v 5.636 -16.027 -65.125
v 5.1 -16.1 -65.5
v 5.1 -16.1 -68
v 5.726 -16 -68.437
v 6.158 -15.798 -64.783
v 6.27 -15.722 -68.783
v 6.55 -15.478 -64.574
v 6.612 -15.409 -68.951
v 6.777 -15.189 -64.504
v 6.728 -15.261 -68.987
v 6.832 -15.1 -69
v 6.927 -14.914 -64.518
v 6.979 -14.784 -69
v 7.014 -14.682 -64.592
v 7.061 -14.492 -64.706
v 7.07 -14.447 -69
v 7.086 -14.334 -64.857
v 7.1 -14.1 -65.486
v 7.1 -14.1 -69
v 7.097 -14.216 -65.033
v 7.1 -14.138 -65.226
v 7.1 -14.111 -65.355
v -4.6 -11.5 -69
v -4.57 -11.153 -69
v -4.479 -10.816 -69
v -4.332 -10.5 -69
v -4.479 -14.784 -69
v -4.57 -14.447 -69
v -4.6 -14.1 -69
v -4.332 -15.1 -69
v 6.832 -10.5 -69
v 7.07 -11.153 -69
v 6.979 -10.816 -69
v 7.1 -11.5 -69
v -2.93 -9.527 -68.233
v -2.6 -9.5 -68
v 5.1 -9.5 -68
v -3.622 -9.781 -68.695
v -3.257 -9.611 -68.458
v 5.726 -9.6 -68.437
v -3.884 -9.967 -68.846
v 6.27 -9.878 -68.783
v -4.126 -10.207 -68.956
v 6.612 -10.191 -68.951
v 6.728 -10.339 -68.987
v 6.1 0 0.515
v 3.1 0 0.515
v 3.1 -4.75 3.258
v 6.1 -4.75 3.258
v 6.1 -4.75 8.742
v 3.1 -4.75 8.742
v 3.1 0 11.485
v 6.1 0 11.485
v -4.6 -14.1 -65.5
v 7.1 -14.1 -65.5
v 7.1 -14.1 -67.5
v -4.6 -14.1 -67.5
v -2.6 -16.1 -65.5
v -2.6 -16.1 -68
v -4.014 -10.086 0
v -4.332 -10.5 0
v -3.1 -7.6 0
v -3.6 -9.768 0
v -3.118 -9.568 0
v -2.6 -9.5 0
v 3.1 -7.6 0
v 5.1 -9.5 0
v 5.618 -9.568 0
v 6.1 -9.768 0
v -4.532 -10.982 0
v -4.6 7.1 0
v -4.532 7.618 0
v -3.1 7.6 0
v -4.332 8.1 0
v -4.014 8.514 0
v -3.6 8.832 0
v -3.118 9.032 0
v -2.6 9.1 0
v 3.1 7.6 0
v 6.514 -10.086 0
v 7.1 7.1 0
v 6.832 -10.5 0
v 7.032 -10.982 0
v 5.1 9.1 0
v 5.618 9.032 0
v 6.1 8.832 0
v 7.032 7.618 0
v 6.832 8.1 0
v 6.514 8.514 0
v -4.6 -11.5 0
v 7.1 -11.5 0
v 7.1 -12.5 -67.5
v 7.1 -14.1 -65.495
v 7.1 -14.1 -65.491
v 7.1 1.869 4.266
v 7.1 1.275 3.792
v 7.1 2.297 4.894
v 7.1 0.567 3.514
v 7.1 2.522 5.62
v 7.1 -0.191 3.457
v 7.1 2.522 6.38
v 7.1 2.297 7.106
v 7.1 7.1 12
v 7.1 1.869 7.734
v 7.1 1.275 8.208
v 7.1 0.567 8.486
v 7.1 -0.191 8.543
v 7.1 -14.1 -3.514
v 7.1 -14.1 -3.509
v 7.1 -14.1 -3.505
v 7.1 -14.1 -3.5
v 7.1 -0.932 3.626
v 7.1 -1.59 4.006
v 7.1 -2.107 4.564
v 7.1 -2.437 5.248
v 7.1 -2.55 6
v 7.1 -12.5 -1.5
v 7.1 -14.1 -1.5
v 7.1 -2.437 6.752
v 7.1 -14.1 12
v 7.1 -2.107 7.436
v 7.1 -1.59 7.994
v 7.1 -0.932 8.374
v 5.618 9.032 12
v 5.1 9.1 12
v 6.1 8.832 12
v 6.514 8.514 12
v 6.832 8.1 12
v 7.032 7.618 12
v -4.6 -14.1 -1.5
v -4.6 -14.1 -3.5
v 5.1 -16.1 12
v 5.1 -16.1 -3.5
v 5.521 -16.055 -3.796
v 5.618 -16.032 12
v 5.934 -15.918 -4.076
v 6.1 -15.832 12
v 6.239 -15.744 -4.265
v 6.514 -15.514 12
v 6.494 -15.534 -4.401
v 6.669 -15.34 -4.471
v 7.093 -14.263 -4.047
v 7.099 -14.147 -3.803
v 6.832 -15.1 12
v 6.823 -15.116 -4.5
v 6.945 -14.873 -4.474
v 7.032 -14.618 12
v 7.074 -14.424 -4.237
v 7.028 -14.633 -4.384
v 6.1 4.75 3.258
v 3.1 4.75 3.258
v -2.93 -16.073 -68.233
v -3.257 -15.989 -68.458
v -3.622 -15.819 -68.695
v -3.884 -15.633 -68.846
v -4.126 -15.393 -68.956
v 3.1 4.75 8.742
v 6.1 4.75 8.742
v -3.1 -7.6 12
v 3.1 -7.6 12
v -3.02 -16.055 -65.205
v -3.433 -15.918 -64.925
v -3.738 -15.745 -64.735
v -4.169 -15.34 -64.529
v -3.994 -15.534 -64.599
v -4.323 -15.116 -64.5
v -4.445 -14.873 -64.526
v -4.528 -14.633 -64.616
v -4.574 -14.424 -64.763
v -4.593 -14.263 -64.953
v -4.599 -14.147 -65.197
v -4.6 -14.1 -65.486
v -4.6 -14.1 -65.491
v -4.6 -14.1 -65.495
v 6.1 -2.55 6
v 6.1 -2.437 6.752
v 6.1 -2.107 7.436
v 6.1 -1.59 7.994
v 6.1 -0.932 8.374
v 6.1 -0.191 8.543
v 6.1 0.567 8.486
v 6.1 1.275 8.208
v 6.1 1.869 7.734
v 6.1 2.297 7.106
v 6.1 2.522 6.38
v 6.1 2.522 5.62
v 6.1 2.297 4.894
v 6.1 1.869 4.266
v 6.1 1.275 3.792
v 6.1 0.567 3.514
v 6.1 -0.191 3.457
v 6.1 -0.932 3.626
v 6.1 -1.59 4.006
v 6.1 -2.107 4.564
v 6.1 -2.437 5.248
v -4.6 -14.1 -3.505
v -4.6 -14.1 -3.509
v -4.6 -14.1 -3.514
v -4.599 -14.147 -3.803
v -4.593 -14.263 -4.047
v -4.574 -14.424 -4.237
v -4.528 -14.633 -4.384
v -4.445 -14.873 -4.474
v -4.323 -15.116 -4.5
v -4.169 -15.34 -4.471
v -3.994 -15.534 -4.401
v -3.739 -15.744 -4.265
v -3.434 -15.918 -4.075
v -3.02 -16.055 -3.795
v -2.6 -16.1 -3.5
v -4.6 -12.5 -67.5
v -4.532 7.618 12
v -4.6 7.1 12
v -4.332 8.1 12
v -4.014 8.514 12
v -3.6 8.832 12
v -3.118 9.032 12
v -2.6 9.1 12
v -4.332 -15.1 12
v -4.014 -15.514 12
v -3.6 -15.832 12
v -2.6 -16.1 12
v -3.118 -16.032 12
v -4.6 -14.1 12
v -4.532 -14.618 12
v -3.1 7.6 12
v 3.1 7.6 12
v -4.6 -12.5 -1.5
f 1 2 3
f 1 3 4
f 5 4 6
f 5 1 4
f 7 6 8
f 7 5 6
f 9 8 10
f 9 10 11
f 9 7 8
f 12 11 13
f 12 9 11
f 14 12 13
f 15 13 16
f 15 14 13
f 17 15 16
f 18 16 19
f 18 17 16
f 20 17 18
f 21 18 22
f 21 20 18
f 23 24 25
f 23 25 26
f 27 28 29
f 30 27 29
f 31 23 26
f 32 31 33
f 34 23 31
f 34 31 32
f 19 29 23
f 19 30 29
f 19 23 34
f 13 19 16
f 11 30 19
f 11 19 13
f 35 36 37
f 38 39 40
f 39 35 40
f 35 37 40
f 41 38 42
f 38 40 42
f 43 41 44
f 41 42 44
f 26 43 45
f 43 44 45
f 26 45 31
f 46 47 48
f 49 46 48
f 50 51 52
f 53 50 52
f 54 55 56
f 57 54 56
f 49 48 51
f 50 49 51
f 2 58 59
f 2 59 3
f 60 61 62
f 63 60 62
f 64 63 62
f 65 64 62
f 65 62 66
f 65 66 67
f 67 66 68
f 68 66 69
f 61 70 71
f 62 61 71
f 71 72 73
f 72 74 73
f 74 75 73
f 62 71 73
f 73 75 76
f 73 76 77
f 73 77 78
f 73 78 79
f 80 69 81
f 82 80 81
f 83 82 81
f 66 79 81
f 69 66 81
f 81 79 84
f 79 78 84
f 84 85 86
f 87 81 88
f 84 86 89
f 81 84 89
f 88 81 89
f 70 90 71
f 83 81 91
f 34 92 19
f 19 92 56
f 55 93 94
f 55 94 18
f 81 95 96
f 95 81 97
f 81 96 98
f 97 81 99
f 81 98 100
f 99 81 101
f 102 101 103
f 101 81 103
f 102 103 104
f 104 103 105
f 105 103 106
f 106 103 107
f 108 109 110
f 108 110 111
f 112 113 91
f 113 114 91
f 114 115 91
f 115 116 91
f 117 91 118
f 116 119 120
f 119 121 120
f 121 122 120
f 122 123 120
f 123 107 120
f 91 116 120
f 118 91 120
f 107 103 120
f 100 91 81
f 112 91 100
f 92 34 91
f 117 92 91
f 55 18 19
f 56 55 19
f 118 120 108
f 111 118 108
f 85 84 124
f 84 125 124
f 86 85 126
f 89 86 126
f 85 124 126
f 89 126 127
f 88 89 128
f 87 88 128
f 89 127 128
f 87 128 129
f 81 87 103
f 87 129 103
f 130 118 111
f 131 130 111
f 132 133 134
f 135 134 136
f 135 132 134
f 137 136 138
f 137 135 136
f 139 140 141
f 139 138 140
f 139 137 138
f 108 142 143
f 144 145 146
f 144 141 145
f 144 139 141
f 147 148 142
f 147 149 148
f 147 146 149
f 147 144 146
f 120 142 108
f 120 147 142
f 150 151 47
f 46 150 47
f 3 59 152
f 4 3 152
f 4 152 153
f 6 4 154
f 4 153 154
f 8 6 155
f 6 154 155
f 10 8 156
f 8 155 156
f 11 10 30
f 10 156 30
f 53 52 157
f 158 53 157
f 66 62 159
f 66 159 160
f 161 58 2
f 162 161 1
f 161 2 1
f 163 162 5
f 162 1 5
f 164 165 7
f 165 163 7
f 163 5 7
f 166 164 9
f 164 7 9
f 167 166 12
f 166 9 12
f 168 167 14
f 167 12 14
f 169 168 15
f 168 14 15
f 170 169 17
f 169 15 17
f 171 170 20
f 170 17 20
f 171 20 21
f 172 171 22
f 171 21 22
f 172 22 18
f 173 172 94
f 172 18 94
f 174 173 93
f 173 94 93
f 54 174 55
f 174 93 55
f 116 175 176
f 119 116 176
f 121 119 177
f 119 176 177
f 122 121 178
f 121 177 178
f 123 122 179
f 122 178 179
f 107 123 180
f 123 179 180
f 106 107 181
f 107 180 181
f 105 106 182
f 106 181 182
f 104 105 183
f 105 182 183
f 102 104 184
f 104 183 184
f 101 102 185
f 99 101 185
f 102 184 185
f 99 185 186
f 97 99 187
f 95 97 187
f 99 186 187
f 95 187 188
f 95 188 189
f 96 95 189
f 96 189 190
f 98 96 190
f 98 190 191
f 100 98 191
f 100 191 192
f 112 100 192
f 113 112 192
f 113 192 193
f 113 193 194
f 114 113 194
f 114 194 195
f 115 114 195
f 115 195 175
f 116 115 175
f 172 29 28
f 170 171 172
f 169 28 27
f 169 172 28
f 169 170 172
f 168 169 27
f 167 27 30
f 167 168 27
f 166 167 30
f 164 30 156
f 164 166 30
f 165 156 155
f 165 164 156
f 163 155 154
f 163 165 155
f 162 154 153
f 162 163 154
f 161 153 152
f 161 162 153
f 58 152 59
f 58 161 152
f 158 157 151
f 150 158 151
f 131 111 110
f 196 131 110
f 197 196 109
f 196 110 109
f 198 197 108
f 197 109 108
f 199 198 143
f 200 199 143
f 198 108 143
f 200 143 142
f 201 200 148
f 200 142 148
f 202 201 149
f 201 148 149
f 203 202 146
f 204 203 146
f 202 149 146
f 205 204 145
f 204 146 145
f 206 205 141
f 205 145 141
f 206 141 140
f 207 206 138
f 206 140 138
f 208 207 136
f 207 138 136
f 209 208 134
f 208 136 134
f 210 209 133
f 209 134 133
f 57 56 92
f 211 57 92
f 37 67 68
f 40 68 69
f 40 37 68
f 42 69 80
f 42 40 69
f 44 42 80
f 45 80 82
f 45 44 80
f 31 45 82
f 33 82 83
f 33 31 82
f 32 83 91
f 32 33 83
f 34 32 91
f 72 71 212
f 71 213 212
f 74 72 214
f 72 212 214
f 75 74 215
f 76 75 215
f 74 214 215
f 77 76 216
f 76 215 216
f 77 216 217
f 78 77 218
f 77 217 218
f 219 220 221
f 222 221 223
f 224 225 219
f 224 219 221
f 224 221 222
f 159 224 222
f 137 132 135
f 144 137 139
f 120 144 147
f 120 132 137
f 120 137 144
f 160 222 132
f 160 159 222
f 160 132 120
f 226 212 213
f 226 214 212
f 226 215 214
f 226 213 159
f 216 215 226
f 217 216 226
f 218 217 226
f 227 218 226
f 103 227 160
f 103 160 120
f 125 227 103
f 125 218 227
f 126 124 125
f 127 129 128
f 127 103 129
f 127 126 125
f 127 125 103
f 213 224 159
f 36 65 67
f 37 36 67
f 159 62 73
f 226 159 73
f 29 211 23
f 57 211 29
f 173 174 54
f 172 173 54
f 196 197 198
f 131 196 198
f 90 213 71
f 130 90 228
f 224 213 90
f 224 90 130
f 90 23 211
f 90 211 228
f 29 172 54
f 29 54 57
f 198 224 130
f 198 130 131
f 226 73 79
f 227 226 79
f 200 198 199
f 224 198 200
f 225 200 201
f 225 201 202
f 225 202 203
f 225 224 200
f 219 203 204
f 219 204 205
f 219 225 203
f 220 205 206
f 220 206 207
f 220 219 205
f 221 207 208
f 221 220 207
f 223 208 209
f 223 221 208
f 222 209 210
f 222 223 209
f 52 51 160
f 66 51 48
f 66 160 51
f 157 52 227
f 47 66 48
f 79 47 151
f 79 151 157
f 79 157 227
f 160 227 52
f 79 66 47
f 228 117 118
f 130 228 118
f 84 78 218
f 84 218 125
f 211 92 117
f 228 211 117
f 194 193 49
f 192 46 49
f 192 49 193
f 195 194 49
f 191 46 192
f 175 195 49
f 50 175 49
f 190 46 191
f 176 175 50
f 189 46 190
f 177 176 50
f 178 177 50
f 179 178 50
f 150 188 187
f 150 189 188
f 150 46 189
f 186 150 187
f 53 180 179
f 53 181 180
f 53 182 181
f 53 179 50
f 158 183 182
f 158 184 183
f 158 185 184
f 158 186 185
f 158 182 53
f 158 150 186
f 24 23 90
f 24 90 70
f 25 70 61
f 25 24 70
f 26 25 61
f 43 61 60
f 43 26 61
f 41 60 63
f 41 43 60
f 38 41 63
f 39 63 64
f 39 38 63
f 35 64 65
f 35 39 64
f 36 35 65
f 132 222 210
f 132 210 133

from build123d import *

# Parameters (mm, degrees)
SKETCH1_W           = 11.7
SKETCH1_H           = 18.2
SKETCH1_W_2         = 6.2
SKETCH1_H_2         = 15.2
BOSS_EXTRUDE1_DEPTH = 12
SKETCH4_R           = 2.55
CUT_EXTRUDE1_DEPTH  = 3
SKETCH4_3_R         = 2.55
CUT_EXTRUDE2_DEPTH  = 17.914490829
SKETCH9_W           = 11.7
SKETCH9_H           = 12
BOSS_EXTRUDE4_DEPTH = 7
SKETCH7_W           = 11.7
SKETCH7_H           = 6.6
BOSS_EXTRUDE3_DEPTH = 69
CUT_EXTRUDE4_DEPTH  = 72.812951478
FILLET1_R           = 2
FILLET2_R           = 1


# Some blends are built 0.0001 mm under size
with BuildPart() as part:
    # Sketch1 → Boss-Extrude1 (new body)
    with BuildSketch(Plane.XY):
        with Locations((1.25, 0)):
            Rectangle(SKETCH1_W, SKETCH1_H)
        Rectangle(SKETCH1_W_2, SKETCH1_H_2, mode=Mode.SUBTRACT)
    extrude(amount=BOSS_EXTRUDE1_DEPTH)

    # Sketch4 → Cut-Extrude1 (cut)
    with BuildSketch(Plane.ZY.offset(-3.1)):
        Polygon((0.515172443, 0), (3.257586221, -4.75), (8.742413779, -4.75), (11.484827557, 0), (8.742413779, 4.75), (3.257586221, 4.75), align=None)
        with Locations(Location((6, 0, 0), (0, 0, 270))):
            Circle(SKETCH4_R, mode=Mode.SUBTRACT)
    extrude(amount=-CUT_EXTRUDE1_DEPTH, mode=Mode.SUBTRACT)

    # Sketch4<3> → Cut-Extrude2 (cut, through all)
    with BuildSketch(Plane.ZY.offset(-3.1)):
        with Locations(Location((6, 0, 0), (0, 0, 270))):
            Circle(SKETCH4_3_R)
    extrude(amount=-CUT_EXTRUDE2_DEPTH, mode=Mode.SUBTRACT)

    # Sketch9 → Boss-Extrude4 (add)
    with BuildSketch(Plane.XZ.offset(9.1)):
        with Locations((1.25, 6)):
            Rectangle(SKETCH9_W, SKETCH9_H)
    extrude(amount=BOSS_EXTRUDE4_DEPTH)

    # Sketch7 → Boss-Extrude3 (add)
    with BuildSketch(Plane(origin=(0, -2.9, 0), x_dir=(1, 0, 0), z_dir=(0, 0, -1))):
        with Locations((1.25, 9.9)):
            Rectangle(SKETCH7_W, SKETCH7_H)
    extrude(amount=BOSS_EXTRUDE3_DEPTH)

    # Sketch10 → Cut-Extrude4 (cut, through all)
    with BuildSketch(Plane(origin=(7.1, 0, 0), x_dir=(0, 0, -1), z_dir=(1, 0, 0))):
        Polygon((64.5, -16.1), (64.5, -14.1), (67.5, -14.1), (67.5, -12.5), (1.5, -12.5), (1.5, -14.1), (4.5, -14.1), (4.5, -16.1), align=None)
    extrude(amount=-CUT_EXTRUDE4_DEPTH, mode=Mode.SUBTRACT)

    # Fillet1
    fillet1_edges = [part.edges().sort_by_distance(p)[0] for p in [
        (7.1, 9.1, 6),
        (-4.6, 9.1, 6),
        (-4.6, -16.1, 3.75),
        (7.1, -16.1, 3.75),
        (7.1, -9.5, -34.5),
        (-4.6, -9.5, -34.5),
        (-4.6, -16.1, -66.75),
        (7.1, -16.1, -66.75),
    ]]
    fillet(fillet1_edges, radius=FILLET1_R - 0.0001)  # a hair under: the kernel refuses the full size

    # Fillet2
    # the kernel refuses this fillet: 1 mm, written as the material it takes off along each edge
    with BuildSketch(Plane(origin=(9.6, -14.1, -4.5), x_dir=(0, -1, 0), z_dir=(-1, 0, 0)), Plane(origin=(9.6, -14.1, -64.5), x_dir=(0, 0, -1), z_dir=(-1, 0, 0))) as fillet2_piece_1:
        with BuildLine():
            CenterArc((FILLET2_R, FILLET2_R), FILLET2_R, 180, 90)
            Line((0, FILLET2_R), (0, 0))
            Line((0, 0), (FILLET2_R, 0))
        make_face()
    extrude(amount=16.7, mode=Mode.SUBTRACT)
    with BuildSketch(Plane(origin=(7.6001, -16.1, -4.5), x_dir=(0, 0, 1), z_dir=(-1, 0, 0)), Plane(origin=(7.6001, -9.5, -69), x_dir=(0, -1, 0), z_dir=(-1, 0, 0)), Plane(origin=(-5.1001, -16.1, -69), x_dir=(0, 1, 0), z_dir=(1, 0, 0)), Plane(origin=(7.6001, -16.1, -64.5), x_dir=(0, 1, 0), z_dir=(-1, 0, 0))) as fillet2_piece_2:
        with BuildLine():
            CenterArc((FILLET2_R, FILLET2_R), FILLET2_R, 180, 90)
            Line((0, FILLET2_R), (0, 0))
            Line((0, 0), (FILLET2_R, 0))
        make_face()
    extrude(amount=12.7002, mode=Mode.SUBTRACT)


solid = part.part
